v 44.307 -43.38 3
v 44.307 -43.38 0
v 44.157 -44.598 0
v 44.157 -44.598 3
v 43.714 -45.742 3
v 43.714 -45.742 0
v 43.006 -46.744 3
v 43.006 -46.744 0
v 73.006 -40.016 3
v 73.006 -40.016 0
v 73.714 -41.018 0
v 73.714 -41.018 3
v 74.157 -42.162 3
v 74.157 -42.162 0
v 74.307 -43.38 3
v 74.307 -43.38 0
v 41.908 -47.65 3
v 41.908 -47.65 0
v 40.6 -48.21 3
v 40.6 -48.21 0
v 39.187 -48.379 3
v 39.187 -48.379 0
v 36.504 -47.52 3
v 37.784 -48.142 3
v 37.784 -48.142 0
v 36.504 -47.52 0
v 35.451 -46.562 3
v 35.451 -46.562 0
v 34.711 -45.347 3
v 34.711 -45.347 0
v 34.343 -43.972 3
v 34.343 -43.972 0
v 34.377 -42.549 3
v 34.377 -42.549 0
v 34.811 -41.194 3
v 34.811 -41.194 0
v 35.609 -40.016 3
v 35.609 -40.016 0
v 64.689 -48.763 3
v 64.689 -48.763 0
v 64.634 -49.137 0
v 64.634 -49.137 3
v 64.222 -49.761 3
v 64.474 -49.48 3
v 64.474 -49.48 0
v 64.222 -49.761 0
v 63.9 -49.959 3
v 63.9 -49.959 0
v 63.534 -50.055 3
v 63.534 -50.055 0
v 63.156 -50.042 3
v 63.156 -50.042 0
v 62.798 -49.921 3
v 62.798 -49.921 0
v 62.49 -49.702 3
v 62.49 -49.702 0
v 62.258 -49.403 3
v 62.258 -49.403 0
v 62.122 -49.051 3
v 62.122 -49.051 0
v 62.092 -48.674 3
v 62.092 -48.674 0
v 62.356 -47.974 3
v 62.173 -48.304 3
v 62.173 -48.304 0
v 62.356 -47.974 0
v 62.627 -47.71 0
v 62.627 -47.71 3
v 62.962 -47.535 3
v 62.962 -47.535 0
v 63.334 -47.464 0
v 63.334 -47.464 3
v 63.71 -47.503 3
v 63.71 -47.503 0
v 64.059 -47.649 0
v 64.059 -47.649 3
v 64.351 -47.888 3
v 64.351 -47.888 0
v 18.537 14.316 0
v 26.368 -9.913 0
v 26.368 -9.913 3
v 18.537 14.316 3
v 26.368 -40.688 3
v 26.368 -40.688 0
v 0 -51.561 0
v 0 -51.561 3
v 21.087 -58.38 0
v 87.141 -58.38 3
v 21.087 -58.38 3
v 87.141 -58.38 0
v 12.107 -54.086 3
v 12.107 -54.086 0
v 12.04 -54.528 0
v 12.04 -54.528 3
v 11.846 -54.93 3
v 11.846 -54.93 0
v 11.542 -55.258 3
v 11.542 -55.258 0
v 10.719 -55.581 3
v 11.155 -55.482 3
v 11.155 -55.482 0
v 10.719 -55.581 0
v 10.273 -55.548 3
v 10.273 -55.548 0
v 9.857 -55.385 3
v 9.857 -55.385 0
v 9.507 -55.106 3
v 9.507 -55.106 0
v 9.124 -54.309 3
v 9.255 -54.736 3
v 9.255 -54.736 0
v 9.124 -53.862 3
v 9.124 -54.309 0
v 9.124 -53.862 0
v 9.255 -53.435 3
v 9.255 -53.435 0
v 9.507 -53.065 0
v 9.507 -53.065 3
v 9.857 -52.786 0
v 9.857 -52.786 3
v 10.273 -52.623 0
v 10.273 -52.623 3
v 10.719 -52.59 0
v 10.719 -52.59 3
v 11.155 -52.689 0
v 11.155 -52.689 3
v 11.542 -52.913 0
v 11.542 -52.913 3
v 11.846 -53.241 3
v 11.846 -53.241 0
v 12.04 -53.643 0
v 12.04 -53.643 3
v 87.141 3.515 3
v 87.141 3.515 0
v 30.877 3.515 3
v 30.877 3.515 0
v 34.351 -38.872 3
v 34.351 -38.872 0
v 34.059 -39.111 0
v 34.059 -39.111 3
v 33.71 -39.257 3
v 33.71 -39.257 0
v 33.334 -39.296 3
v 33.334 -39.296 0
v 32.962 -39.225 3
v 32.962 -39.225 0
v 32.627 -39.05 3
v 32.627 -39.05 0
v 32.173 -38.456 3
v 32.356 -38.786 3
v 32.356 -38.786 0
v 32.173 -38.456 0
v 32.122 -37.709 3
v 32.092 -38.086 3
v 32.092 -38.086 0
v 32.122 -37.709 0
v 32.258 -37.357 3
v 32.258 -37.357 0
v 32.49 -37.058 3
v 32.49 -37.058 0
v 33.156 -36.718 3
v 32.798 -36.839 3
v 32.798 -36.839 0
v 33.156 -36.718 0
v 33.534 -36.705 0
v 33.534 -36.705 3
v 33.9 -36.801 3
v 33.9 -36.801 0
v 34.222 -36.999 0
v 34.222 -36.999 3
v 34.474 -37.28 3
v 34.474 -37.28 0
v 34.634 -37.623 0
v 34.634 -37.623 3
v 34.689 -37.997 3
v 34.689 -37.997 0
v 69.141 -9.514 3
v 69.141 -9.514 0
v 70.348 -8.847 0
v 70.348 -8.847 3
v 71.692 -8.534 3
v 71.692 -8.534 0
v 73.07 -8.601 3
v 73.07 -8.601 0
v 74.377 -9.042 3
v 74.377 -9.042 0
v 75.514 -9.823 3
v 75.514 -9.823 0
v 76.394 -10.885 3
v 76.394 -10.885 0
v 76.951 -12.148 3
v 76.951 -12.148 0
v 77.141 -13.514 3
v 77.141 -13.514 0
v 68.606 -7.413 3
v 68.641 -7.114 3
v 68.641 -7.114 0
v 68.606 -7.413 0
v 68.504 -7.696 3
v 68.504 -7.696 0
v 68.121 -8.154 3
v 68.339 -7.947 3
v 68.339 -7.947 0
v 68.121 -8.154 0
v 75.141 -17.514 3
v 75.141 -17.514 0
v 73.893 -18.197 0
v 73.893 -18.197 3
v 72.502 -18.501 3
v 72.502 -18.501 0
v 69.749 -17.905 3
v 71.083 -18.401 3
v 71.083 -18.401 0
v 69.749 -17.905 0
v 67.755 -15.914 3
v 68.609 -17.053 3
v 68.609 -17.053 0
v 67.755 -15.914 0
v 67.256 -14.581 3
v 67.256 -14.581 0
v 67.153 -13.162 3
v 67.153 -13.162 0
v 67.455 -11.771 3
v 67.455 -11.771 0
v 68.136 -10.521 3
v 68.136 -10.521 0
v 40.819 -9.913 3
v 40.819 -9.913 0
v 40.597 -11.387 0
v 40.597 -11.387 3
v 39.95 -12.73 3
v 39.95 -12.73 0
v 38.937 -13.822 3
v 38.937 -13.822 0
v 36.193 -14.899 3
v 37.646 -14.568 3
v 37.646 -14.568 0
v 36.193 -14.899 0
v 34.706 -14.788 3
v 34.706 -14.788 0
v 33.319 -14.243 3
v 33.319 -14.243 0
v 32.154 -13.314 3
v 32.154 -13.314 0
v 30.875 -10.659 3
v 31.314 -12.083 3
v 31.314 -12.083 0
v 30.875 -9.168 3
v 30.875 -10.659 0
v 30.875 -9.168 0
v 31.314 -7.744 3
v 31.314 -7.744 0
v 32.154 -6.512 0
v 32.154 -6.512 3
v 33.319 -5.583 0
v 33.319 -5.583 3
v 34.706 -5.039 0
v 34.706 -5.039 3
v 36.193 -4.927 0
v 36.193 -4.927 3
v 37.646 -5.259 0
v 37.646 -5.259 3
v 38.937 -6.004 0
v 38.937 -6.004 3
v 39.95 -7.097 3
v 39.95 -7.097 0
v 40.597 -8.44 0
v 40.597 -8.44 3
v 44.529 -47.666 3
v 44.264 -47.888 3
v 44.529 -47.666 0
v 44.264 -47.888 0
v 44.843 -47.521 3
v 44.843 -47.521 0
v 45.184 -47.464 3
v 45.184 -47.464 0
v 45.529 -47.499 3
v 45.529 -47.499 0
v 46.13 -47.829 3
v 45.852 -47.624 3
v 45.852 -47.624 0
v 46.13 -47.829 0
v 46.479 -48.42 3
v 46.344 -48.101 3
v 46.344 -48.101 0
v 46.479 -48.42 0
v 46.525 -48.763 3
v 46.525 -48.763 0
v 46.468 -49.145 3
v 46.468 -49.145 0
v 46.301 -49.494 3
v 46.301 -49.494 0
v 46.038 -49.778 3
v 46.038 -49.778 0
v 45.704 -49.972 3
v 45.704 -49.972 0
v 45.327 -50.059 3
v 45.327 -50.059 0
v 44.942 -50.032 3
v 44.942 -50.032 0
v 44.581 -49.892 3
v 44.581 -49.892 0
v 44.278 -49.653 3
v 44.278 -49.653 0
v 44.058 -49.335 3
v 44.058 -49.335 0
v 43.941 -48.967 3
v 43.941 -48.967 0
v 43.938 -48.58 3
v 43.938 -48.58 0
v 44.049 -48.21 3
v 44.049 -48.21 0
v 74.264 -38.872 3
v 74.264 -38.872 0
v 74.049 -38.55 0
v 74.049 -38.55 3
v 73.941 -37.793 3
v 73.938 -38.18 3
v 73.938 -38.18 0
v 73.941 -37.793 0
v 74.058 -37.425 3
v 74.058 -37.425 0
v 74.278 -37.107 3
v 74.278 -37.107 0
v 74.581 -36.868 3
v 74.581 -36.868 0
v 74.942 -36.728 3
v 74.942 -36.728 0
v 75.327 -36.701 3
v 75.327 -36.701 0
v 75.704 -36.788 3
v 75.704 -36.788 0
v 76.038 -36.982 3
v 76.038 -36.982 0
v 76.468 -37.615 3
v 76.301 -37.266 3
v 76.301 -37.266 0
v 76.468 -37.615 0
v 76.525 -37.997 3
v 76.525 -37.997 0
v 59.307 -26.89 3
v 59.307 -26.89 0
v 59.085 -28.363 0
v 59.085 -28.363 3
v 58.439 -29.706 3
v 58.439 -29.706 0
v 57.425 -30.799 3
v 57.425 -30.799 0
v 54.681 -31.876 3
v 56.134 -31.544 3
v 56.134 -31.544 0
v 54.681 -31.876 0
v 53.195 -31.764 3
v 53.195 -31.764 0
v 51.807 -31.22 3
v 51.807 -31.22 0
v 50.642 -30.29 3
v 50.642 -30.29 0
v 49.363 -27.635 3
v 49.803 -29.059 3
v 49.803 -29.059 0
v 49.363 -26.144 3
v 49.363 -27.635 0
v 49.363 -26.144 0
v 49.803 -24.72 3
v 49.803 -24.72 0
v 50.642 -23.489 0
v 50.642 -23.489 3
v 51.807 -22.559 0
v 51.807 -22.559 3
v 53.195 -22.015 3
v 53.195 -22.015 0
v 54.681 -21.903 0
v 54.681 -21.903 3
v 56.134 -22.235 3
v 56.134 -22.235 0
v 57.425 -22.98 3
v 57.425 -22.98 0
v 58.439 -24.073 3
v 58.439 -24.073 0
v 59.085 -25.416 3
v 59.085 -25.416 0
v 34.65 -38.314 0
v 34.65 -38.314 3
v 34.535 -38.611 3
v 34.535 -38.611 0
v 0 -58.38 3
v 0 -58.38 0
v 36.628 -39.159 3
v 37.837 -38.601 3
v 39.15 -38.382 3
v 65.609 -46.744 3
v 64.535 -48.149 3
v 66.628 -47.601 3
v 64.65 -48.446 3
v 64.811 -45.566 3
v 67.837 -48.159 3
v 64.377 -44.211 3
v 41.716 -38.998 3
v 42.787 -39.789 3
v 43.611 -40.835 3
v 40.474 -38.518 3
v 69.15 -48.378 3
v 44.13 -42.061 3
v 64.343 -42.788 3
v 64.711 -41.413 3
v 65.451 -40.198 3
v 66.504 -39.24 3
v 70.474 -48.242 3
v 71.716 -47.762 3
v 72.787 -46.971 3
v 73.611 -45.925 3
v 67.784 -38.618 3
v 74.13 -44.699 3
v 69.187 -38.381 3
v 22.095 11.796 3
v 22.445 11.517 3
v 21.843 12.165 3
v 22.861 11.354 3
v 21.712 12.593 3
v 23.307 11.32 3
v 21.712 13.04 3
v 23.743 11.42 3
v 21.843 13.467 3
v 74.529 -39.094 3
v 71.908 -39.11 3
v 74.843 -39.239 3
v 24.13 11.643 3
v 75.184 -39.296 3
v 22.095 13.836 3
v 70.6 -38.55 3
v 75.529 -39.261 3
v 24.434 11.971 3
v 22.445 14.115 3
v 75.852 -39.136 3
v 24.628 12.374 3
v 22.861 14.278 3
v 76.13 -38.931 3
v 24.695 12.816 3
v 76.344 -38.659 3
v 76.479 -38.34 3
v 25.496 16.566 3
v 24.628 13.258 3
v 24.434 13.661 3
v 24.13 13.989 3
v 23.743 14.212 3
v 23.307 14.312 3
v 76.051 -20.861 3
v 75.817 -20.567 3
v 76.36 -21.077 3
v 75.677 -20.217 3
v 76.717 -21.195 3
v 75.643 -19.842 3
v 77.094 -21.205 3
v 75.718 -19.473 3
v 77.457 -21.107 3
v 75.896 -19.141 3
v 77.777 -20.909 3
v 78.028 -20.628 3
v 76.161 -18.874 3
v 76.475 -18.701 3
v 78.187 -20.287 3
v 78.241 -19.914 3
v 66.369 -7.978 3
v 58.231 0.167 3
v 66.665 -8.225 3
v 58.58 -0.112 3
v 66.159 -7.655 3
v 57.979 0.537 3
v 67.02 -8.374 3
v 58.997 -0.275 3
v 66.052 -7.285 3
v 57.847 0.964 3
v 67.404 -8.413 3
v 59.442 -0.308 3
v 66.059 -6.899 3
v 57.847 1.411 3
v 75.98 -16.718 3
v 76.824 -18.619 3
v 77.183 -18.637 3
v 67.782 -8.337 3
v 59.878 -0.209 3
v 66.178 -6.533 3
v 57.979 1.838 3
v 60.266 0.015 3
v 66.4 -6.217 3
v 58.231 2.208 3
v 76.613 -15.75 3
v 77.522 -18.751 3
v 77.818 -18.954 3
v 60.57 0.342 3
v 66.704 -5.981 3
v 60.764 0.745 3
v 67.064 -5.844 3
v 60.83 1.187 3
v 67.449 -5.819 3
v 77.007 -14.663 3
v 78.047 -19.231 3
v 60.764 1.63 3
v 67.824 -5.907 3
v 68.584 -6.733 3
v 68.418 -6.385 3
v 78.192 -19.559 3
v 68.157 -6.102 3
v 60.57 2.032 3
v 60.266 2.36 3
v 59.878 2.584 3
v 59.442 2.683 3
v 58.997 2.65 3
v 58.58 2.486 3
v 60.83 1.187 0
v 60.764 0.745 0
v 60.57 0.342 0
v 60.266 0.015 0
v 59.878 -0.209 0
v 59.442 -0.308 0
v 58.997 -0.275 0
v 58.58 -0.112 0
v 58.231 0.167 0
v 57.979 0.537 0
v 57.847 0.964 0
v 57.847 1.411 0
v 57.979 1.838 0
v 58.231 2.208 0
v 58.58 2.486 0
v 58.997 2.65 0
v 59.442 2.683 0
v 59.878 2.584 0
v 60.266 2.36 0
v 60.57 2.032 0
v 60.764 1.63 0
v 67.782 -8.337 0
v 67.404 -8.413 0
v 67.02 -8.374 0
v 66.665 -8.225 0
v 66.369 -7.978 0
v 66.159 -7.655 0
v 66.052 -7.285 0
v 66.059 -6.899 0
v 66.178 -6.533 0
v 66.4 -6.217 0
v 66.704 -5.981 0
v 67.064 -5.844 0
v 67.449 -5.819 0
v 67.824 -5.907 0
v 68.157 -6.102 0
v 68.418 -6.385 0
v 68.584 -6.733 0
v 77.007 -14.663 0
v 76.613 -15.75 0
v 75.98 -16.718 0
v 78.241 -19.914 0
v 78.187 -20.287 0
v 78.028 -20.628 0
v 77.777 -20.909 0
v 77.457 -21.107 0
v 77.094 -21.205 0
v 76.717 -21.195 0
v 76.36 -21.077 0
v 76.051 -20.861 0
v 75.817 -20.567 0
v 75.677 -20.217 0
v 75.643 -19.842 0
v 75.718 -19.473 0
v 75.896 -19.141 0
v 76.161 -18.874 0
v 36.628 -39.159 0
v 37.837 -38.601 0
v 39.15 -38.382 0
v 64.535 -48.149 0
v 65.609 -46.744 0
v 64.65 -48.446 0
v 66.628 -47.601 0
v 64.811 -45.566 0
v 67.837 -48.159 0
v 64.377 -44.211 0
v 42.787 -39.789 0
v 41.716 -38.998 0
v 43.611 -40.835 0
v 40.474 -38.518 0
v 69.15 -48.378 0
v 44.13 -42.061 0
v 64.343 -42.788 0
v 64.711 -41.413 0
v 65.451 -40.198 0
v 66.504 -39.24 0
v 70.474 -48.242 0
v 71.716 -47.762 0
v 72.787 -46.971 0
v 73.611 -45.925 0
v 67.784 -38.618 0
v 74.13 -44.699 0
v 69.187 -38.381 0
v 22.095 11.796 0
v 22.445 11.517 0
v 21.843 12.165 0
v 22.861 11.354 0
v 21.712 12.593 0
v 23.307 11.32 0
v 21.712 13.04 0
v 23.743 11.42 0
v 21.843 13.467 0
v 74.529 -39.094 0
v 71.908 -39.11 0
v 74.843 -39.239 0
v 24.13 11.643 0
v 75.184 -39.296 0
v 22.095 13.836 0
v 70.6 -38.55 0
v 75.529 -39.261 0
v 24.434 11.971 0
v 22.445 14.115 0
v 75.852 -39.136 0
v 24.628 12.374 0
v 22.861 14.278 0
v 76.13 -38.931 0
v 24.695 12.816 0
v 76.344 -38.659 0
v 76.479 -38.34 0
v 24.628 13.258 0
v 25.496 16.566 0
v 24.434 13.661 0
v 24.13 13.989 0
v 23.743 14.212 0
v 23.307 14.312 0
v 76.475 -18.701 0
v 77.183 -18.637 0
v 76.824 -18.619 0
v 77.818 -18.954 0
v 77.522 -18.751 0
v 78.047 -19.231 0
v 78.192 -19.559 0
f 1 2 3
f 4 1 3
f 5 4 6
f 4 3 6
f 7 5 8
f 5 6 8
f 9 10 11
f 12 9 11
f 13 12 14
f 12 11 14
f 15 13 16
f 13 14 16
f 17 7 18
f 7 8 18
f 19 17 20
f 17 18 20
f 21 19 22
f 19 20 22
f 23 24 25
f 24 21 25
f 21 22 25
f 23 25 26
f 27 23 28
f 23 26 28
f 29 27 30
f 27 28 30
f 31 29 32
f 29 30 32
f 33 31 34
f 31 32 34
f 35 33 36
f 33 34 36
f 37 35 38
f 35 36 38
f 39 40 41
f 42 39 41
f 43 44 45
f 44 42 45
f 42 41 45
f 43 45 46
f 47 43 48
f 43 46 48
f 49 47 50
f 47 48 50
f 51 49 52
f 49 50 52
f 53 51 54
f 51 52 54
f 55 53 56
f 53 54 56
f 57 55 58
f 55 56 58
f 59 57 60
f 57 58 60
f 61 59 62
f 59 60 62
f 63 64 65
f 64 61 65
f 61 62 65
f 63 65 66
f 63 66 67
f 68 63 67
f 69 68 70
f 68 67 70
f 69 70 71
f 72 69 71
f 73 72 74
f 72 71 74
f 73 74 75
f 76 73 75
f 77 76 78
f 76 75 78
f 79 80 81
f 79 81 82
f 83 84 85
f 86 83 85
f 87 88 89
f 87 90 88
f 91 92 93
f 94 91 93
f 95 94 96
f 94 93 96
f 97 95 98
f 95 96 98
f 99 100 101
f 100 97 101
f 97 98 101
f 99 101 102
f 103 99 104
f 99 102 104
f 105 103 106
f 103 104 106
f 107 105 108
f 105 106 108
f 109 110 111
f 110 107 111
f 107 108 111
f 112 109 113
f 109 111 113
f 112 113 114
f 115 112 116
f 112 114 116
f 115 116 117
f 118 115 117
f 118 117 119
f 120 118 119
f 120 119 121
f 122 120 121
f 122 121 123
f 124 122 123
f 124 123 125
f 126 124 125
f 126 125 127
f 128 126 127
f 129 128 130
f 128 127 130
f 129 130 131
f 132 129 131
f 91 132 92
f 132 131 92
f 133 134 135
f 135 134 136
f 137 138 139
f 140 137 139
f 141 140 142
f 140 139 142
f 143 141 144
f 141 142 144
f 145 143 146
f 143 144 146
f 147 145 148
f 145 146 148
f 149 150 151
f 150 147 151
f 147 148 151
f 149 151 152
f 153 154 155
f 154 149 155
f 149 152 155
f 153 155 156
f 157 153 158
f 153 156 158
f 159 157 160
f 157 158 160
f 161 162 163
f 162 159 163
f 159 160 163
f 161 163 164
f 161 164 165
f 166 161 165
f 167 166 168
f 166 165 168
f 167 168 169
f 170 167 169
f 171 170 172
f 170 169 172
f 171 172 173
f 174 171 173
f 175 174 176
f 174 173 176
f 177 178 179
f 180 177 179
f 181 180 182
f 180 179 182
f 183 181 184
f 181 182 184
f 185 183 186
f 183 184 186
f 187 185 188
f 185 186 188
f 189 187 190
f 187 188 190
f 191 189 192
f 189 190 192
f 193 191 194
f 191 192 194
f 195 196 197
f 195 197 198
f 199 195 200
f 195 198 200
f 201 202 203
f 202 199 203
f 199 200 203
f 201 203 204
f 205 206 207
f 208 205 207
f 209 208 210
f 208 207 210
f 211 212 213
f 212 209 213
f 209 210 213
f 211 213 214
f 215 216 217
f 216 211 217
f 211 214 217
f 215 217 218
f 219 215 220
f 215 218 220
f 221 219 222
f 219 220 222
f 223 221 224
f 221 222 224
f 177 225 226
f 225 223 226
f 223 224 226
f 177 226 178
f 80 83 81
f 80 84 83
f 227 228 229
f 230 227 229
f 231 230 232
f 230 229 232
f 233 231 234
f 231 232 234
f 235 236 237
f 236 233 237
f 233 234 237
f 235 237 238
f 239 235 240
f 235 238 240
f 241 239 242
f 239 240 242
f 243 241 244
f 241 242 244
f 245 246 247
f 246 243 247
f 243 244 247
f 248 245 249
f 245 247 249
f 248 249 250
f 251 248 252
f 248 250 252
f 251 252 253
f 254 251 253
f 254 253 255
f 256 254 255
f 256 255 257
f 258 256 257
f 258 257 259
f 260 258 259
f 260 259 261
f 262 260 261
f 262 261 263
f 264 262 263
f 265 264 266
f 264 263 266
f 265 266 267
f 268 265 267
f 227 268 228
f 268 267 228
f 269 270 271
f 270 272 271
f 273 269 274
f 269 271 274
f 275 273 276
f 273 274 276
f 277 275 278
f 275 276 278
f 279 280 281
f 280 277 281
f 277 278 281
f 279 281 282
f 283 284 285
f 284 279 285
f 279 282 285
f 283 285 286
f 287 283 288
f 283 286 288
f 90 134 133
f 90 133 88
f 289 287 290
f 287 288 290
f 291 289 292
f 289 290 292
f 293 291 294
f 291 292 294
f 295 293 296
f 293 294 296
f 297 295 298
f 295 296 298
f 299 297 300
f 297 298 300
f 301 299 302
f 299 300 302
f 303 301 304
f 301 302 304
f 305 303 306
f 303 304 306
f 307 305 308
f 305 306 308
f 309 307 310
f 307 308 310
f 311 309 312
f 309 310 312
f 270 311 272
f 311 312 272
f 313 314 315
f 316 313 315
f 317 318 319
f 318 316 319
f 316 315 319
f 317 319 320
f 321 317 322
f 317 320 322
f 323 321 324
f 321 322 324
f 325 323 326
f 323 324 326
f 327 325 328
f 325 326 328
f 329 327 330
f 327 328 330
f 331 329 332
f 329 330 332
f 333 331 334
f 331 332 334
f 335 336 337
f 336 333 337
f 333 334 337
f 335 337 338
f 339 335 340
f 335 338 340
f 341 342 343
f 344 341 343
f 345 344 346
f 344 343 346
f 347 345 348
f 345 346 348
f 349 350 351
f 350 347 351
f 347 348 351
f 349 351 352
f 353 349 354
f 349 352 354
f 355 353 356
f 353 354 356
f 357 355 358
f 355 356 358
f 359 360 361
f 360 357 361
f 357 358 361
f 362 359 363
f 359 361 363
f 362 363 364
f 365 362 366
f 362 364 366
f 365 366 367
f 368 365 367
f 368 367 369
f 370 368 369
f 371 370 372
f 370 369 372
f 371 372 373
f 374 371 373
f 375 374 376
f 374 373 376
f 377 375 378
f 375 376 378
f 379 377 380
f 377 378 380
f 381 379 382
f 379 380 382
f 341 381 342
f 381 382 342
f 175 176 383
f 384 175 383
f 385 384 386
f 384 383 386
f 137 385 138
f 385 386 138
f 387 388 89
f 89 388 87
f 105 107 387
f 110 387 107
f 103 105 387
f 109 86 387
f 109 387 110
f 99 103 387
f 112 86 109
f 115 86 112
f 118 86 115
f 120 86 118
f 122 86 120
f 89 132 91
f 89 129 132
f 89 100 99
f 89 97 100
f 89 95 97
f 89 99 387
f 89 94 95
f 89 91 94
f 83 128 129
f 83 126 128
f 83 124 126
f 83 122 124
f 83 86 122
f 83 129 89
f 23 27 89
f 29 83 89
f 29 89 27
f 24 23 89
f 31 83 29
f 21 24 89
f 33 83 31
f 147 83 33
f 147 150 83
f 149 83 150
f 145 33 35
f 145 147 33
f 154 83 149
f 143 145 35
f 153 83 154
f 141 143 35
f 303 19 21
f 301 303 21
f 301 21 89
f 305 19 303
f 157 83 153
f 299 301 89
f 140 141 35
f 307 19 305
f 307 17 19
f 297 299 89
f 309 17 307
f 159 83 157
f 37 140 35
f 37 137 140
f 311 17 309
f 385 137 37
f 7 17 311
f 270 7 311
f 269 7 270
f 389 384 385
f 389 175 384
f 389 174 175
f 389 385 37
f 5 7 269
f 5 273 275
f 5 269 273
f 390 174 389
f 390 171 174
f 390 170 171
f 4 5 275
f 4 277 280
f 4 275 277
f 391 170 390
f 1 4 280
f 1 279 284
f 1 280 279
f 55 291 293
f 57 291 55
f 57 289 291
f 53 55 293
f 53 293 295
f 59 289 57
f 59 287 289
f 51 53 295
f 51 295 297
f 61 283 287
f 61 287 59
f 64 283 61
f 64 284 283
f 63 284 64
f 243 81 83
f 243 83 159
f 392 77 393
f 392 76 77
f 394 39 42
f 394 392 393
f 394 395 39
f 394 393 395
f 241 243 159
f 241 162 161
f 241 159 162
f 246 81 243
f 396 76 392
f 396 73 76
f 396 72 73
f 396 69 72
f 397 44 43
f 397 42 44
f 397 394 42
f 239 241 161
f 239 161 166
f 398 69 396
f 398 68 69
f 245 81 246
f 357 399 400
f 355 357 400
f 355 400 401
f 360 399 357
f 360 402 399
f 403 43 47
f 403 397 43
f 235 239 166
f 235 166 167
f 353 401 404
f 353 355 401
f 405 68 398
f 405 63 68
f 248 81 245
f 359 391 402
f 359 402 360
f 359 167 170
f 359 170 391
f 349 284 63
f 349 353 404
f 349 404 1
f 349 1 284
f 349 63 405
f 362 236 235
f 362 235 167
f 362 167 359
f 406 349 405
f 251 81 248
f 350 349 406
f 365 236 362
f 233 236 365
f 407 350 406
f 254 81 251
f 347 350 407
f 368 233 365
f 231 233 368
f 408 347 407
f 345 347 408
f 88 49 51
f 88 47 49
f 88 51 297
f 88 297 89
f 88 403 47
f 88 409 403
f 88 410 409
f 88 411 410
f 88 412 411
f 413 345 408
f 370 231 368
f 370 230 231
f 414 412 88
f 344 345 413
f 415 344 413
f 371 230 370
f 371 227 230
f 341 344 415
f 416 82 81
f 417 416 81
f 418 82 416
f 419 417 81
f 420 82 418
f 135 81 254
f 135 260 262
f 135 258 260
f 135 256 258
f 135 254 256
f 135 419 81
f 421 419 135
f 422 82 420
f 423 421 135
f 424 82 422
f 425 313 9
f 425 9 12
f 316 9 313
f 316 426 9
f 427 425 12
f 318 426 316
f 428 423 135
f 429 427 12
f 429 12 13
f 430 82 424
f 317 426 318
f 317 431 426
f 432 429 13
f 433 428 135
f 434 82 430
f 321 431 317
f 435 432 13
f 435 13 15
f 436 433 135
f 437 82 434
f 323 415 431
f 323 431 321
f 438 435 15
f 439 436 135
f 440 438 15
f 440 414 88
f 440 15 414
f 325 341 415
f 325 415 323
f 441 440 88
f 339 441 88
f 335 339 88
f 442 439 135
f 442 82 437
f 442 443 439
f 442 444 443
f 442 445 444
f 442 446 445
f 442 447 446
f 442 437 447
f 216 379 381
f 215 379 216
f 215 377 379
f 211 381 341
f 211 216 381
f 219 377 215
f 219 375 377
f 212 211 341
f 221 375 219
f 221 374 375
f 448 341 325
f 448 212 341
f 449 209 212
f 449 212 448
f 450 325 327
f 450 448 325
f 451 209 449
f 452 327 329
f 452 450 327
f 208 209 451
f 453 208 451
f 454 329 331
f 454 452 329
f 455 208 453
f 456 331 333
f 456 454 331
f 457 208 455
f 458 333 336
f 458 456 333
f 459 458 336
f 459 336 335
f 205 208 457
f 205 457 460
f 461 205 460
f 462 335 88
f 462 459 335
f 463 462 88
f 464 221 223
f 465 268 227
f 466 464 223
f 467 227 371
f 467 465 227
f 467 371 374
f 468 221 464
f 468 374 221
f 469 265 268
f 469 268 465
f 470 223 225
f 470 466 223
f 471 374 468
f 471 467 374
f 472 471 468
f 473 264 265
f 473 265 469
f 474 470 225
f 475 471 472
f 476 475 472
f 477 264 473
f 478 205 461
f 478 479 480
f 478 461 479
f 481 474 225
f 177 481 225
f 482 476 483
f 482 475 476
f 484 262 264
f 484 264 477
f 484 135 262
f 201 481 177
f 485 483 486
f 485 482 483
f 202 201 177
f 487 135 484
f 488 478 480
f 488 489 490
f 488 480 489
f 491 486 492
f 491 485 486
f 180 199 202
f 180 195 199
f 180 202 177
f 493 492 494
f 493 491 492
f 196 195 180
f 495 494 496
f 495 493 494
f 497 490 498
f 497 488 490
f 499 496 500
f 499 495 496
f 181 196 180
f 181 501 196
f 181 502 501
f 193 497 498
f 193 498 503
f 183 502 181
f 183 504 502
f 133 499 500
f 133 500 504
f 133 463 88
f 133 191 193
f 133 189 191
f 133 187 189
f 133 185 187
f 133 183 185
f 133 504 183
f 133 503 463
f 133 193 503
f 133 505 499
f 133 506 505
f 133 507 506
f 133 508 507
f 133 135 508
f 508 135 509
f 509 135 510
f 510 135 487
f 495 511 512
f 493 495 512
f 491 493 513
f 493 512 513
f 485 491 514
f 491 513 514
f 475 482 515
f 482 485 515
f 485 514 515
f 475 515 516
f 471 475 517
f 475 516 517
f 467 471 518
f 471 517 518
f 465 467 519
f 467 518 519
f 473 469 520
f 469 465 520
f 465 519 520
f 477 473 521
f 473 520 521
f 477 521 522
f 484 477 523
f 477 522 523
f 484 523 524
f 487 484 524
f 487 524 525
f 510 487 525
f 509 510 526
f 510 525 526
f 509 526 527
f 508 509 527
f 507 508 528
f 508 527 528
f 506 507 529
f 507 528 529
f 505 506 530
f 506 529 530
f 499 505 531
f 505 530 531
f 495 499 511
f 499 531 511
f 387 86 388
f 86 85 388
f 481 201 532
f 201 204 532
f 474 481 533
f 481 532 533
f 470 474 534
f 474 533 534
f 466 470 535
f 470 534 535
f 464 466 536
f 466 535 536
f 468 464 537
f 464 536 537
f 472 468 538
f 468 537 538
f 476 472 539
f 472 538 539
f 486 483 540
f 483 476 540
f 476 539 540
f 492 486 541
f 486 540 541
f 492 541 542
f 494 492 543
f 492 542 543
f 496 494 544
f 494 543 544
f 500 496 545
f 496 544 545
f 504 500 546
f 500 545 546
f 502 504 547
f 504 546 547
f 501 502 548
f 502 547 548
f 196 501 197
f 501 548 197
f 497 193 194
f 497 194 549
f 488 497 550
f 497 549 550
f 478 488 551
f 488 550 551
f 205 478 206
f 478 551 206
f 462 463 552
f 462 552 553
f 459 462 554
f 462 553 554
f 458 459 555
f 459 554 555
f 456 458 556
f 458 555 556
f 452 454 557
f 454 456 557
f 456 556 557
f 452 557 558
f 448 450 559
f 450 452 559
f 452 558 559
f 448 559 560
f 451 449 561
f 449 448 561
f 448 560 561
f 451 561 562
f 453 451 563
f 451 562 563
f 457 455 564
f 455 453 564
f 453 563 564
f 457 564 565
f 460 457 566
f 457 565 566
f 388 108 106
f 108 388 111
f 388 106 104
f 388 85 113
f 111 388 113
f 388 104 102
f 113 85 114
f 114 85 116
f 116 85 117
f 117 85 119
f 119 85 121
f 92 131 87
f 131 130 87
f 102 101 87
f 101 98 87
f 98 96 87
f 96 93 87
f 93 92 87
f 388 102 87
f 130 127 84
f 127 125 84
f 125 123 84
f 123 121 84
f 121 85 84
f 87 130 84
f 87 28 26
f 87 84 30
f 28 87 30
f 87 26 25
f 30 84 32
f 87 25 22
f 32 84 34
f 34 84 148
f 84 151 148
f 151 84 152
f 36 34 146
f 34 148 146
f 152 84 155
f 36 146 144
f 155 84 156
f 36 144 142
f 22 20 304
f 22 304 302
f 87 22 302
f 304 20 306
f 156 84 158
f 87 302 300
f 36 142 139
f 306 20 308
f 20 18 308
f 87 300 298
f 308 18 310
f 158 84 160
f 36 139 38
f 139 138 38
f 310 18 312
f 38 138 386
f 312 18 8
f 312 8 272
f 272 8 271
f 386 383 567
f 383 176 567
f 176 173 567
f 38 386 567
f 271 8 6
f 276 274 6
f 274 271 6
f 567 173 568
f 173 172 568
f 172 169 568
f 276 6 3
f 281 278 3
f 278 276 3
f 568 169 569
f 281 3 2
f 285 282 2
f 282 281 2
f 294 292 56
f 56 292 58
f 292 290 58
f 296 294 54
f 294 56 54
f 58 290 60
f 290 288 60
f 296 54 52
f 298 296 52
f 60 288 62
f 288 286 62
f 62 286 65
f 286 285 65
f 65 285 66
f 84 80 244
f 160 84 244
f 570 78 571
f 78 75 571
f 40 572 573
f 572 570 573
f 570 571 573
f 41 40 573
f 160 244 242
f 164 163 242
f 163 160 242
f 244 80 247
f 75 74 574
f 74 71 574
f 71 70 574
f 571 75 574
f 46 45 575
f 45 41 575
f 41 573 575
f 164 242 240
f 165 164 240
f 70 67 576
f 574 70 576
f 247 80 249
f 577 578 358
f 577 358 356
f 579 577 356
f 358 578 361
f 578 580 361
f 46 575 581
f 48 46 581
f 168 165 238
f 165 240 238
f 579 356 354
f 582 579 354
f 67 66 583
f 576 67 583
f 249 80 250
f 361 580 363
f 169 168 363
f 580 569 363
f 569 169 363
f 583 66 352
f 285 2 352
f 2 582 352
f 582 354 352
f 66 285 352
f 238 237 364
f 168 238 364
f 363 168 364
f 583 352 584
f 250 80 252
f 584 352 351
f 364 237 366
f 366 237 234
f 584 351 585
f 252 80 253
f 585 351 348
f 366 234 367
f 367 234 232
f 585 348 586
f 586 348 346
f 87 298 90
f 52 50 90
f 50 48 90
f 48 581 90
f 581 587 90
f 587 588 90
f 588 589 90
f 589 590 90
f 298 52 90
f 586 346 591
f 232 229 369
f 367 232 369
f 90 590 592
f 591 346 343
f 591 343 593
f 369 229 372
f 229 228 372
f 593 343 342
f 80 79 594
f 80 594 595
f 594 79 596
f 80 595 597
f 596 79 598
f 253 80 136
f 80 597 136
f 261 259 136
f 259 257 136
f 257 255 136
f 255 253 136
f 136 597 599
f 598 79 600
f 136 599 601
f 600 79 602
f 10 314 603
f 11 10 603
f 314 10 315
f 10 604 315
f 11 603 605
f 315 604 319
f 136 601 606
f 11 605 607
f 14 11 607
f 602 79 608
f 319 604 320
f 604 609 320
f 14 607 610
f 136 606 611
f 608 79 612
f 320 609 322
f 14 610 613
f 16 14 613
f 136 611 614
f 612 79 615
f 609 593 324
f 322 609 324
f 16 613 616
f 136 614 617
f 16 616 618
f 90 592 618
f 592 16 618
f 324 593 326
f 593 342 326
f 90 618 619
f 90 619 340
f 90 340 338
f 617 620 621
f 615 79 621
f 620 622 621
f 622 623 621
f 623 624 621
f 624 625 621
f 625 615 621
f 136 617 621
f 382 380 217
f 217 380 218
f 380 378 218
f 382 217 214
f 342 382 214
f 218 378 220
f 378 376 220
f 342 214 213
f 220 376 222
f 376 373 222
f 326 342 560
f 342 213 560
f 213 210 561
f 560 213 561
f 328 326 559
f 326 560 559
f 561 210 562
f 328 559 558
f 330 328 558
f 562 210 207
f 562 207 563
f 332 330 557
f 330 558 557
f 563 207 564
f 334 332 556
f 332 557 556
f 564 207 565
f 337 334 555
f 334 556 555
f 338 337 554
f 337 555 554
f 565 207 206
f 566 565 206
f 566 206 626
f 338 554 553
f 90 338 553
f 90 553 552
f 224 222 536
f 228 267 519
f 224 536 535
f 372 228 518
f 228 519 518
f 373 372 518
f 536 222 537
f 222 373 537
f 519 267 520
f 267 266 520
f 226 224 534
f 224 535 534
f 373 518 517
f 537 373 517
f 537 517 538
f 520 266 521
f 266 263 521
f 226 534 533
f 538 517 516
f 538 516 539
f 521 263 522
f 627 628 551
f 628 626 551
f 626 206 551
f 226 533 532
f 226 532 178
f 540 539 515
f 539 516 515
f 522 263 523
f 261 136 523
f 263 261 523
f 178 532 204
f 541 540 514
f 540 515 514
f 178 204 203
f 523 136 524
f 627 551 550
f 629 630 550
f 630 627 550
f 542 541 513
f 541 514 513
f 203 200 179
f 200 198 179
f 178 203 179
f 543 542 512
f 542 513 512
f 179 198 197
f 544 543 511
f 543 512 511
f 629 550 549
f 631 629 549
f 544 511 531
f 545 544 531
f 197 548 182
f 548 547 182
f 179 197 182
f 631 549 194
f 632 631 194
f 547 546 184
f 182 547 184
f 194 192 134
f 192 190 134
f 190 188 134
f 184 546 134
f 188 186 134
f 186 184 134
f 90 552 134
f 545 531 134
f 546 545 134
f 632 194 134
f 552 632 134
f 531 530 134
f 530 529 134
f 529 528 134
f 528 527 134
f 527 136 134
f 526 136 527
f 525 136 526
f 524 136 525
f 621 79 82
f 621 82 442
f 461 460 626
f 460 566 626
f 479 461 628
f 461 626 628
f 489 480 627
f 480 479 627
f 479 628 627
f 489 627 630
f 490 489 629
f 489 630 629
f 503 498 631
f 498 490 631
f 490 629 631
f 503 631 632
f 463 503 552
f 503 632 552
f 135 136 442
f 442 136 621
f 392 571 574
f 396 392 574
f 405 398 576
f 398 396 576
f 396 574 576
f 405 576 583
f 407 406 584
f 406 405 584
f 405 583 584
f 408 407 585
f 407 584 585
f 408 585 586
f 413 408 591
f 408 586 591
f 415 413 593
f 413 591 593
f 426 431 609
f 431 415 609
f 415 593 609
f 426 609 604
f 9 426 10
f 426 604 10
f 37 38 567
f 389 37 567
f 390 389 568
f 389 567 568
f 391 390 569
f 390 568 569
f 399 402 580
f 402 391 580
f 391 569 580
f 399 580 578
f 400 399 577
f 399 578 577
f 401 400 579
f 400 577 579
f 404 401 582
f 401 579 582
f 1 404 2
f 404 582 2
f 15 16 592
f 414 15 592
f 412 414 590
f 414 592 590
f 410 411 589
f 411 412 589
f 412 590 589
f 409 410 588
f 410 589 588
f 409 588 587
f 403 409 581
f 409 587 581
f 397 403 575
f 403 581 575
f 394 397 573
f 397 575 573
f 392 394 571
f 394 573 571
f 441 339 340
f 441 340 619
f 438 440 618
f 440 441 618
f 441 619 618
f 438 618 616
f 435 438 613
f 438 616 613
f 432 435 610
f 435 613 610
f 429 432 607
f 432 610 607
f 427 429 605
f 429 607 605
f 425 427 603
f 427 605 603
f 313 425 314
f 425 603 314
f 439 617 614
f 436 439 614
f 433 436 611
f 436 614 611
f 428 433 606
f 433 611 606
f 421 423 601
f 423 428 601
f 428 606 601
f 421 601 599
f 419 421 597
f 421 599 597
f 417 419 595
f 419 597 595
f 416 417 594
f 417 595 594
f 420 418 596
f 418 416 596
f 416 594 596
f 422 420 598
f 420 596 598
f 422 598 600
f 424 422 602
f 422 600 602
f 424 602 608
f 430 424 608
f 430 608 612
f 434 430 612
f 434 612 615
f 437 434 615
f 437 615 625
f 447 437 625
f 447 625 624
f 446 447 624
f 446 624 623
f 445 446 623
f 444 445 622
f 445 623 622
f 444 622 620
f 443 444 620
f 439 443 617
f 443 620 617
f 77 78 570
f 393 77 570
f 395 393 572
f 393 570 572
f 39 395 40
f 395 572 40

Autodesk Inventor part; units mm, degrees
ref_plane "YZ Plane" through (0, 0, 0) normal (1, 0, 0) x (0, 1, 0)
ref_plane "XZ Plane" through (0, 0, 0) normal (0, 1, 0) x (-1, 0, 0)
ref_plane "XY Plane" through (0, 0, 0) normal (0, 0, 1) x (1, 0, 0)
sketch "ギア線図" plane through (0, 0, 0) normal (0, 0, 1) x (1, 0, 0)
  circle A0 centre (11.2246, -29.111) radius 11.1
  circle A1 centre (54.3074, -26.8895) radius 20.05
  circle A2 centre (54.3074, -26.8895) radius 4.55
  circle A3 centre (35.8191, -9.9133) radius 11.1
  circle A4 centre (39.3074, -43.38) radius 2.05
  circle A5 centre (69.3074, -43.38) radius 2.05
  circle A6 centre (72.141, -13.5141) radius 2.05
  circle A7 centre (39.3074, -43.38) radius 15
  circle A8 centre (69.3074, -43.38) radius 15
  circle A9 centre (72.141, -13.5141) radius 15
  circle A10 centre (54.3074, -26.8895) radius 5.5 construction
  circle A11 centre (11.2246, -29.111) radius 13 construction
  circle A12 centre (54.3074, -26.8895) radius 20.5 construction
  circle A13 centre (35.8191, -9.9133) radius 20.55
  circle A14 centre (35.8191, -9.9133) radius 21.5 construction
  circle A15 centre (35.8191, -9.9133) radius 13 construction
  circle A16 centre (39.3074, -43.38) radius 2.5 construction
  circle A17 centre (69.3074, -43.38) radius 2.5 construction
  circle A18 centre (72.141, -13.5141) radius 2.5 construction
  circle A19 centre (11.2246, -29.111) radius 20.1
  circle A20 centre (11.2246, -29.111) radius 22 construction
  line L0 (39.3074, -43.38) -> (69.3074, -43.38)
  circle A21 centre (0, 0) radius 20.1
  circle A22 centre (0, 0) radius 22 construction
  circle A23 centre (39.3074, -43.38) radius 9.5 construction
  circle A24 centre (69.3074, -43.38) radius 9.5 construction
  circle A25 centre (72.141, -13.5141) radius 9.5 construction
  point P0 (58.2233, -20.0465)
  point P1 (42.0436, -35)
  point P2 (21.5995, 15.2696)
  point P3 (38.2329, 5.9161)
  point P4 (24.1755, 8.4229)
  point P5 (21.6039, 15.1272)
  point P6 (23.3458, 16.3469)
  point P7 (23.3177, 16.3886)
  dimension "d7" = 22.2
  dimension "d8" = 40.1
  dimension "d9" = 9.1
  dimension "d11" = 22.2
  dimension "d12" = 4.1
  dimension "d13" = 4.1
  dimension "d14" = 4.1
  dimension "d15" = 30
  dimension "d16" = 30
  dimension "d17" = 30
  dimension "d18" = 11
  dimension "d21" = 26
  dimension "d29" = 41
  dimension "d39" = 22.2921
  dimension "d40" = 22.2921
  dimension "d41" = 22.2921
  dimension "d43" = 41.1
  dimension "d44" = 43
  dimension "d45" = 26
  dimension "d46" = 5
  dimension "d47" = 5
  dimension "d48" = 5
  dimension "d49" = 40.2
  dimension "d50" = 44
  dimension "d53" = 40.2
  dimension "d55" = 44
  dimension "d58" = 19
  dimension "d59" = 19
  dimension "d60" = 19
sketch "スケッチ3" plane through (0, 0, 0) normal (0, 0, 1) x (1, 0, 0)
  circle A0 centre (54.3074, -26.8895) radius 20.05 construction
  circle A1 centre (39.3074, -43.38) radius 2.05 construction
  circle A2 centre (69.3074, -43.38) radius 2.05 construction
  circle A3 centre (72.141, -13.5141) radius 2.05 construction
  circle A4 centre (39.3074, -43.38) radius 15 construction
  circle A5 centre (69.3074, -43.38) radius 15 construction
  circle A6 centre (72.141, -13.5141) radius 15 construction
  line L0 (39.3074, -43.38) -> (45.2254, -48.7631)
  line L1 (45.2254, -48.7631) -> (39.3074, -43.38)
  line L2 (39.3074, -43.38) -> (33.3894, -37.9969)
  line L3 (39.3074, -43.38) -> (40.8161, -41.7214)
  circle A7 centre (33.3894, -37.9969) radius 1.3
  circle A8 centre (45.2254, -48.7631) radius 1.3
  line L4 (69.3074, -43.38) -> (67.7987, -41.7214)
  line L5 (69.3074, -43.38) -> (75.2254, -37.9969)
  line L6 (69.3074, -43.38) -> (63.3894, -48.7631)
  circle A9 centre (63.3894, -48.7631) radius 1.3
  circle A10 centre (75.2254, -37.9969) radius 1.3
  line L7 (72.141, -13.5141) -> (70.3474, -14.8594)
  line L8 (67.341, -7.1142) -> (72.141, -13.5141)
  line L9 (72.141, -13.5141) -> (76.9411, -19.9141)
  circle A11 centre (67.341, -7.1142) radius 1.3
  circle A12 centre (76.9411, -19.9141) radius 1.3
  circle A13 centre (39.3074, -43.38) radius 5
  circle A14 centre (69.3074, -43.38) radius 5
  circle A15 centre (72.141, -13.5141) radius 5
  circle A16 centre (54.3074, -26.8895) radius 5
  circle A17 centre (35.8191, -9.9133) radius 11.1 construction
  line L10 (87.141, -58.38) -> (21.087, -58.38)
  line L11 (87.141, 3.5148) -> (87.141, -58.38)
  circle A18 centre (35.8191, -9.9133) radius 5
  circle A19 centre (23.1948, 12.8161) radius 1.5
  circle A20 centre (59.3303, 1.1874) radius 1.5
  circle A21 centre (11.2246, -29.111) radius 5
  circle A22 centre (10.6068, -54.0855) radius 1.5
  line L12 (87.141, 3.5148) -> (30.8773, 3.5148)
  line L13 (30.8773, 3.5148) -> (25.4959, 16.5655)
  line L14 (26.368, -40.6885) -> (0, -51.5612)
  line L15 (0, -51.5612) -> (0, -58.38)
  line L16 (0, -58.38) -> (21.087, -58.38)
  line L17 (26.368, -40.6885) -> (26.368, -9.9133)
  line L18 (26.368, -9.9133) -> (18.5366, 14.3161)
  line L19 (18.5366, 14.3161) -> (25.4959, 16.5655)
  point P0 (0, 0)
  point P1 (0, 0)
  dimension "d61" = 8
  dimension "d62" = 8
  dimension "d63" = 2.6
  dimension "d64" = 2.6
  dimension "d65" = 8
  dimension "d66" = 8
  dimension "d67" = 2.6
  dimension "d68" = 2.6
  dimension "d69" = 8
  dimension "d70" = 8
  dimension "d71" = 2.6
  dimension "d72" = 2.6
  dimension "d73" = 10
  dimension "d74" = 10
  dimension "d75" = 10
  dimension "d76" = 10
  dimension "d79" = 10
extrude "押し出し1" add sketch "スケッチ3" along normal blind 3 contours L10 L16 L15 L14 L17 L18 L19 L13 L12 L11
sketch "スケッチ5" plane through (0, 0, 3) normal (0, 0, 1) x (1, 0, 0)
  circle A0 centre (10.6068, -54.0855) radius 1.5 projected
  circle A1 centre (23.1948, 12.8161) radius 1.5 projected
  circle A2 centre (59.3303, 1.1874) radius 1.5 projected
  circle A3 centre (54.3074, -26.8895) radius 5 projected
  circle A4 centre (35.8191, -9.9133) radius 5 projected
  point P0 (0, 0)
equation "\"d40\" = d39"
equation "\"d41\" = d40"
properties part number "モーターマウント" material "アルミニウム 2014-T4"
